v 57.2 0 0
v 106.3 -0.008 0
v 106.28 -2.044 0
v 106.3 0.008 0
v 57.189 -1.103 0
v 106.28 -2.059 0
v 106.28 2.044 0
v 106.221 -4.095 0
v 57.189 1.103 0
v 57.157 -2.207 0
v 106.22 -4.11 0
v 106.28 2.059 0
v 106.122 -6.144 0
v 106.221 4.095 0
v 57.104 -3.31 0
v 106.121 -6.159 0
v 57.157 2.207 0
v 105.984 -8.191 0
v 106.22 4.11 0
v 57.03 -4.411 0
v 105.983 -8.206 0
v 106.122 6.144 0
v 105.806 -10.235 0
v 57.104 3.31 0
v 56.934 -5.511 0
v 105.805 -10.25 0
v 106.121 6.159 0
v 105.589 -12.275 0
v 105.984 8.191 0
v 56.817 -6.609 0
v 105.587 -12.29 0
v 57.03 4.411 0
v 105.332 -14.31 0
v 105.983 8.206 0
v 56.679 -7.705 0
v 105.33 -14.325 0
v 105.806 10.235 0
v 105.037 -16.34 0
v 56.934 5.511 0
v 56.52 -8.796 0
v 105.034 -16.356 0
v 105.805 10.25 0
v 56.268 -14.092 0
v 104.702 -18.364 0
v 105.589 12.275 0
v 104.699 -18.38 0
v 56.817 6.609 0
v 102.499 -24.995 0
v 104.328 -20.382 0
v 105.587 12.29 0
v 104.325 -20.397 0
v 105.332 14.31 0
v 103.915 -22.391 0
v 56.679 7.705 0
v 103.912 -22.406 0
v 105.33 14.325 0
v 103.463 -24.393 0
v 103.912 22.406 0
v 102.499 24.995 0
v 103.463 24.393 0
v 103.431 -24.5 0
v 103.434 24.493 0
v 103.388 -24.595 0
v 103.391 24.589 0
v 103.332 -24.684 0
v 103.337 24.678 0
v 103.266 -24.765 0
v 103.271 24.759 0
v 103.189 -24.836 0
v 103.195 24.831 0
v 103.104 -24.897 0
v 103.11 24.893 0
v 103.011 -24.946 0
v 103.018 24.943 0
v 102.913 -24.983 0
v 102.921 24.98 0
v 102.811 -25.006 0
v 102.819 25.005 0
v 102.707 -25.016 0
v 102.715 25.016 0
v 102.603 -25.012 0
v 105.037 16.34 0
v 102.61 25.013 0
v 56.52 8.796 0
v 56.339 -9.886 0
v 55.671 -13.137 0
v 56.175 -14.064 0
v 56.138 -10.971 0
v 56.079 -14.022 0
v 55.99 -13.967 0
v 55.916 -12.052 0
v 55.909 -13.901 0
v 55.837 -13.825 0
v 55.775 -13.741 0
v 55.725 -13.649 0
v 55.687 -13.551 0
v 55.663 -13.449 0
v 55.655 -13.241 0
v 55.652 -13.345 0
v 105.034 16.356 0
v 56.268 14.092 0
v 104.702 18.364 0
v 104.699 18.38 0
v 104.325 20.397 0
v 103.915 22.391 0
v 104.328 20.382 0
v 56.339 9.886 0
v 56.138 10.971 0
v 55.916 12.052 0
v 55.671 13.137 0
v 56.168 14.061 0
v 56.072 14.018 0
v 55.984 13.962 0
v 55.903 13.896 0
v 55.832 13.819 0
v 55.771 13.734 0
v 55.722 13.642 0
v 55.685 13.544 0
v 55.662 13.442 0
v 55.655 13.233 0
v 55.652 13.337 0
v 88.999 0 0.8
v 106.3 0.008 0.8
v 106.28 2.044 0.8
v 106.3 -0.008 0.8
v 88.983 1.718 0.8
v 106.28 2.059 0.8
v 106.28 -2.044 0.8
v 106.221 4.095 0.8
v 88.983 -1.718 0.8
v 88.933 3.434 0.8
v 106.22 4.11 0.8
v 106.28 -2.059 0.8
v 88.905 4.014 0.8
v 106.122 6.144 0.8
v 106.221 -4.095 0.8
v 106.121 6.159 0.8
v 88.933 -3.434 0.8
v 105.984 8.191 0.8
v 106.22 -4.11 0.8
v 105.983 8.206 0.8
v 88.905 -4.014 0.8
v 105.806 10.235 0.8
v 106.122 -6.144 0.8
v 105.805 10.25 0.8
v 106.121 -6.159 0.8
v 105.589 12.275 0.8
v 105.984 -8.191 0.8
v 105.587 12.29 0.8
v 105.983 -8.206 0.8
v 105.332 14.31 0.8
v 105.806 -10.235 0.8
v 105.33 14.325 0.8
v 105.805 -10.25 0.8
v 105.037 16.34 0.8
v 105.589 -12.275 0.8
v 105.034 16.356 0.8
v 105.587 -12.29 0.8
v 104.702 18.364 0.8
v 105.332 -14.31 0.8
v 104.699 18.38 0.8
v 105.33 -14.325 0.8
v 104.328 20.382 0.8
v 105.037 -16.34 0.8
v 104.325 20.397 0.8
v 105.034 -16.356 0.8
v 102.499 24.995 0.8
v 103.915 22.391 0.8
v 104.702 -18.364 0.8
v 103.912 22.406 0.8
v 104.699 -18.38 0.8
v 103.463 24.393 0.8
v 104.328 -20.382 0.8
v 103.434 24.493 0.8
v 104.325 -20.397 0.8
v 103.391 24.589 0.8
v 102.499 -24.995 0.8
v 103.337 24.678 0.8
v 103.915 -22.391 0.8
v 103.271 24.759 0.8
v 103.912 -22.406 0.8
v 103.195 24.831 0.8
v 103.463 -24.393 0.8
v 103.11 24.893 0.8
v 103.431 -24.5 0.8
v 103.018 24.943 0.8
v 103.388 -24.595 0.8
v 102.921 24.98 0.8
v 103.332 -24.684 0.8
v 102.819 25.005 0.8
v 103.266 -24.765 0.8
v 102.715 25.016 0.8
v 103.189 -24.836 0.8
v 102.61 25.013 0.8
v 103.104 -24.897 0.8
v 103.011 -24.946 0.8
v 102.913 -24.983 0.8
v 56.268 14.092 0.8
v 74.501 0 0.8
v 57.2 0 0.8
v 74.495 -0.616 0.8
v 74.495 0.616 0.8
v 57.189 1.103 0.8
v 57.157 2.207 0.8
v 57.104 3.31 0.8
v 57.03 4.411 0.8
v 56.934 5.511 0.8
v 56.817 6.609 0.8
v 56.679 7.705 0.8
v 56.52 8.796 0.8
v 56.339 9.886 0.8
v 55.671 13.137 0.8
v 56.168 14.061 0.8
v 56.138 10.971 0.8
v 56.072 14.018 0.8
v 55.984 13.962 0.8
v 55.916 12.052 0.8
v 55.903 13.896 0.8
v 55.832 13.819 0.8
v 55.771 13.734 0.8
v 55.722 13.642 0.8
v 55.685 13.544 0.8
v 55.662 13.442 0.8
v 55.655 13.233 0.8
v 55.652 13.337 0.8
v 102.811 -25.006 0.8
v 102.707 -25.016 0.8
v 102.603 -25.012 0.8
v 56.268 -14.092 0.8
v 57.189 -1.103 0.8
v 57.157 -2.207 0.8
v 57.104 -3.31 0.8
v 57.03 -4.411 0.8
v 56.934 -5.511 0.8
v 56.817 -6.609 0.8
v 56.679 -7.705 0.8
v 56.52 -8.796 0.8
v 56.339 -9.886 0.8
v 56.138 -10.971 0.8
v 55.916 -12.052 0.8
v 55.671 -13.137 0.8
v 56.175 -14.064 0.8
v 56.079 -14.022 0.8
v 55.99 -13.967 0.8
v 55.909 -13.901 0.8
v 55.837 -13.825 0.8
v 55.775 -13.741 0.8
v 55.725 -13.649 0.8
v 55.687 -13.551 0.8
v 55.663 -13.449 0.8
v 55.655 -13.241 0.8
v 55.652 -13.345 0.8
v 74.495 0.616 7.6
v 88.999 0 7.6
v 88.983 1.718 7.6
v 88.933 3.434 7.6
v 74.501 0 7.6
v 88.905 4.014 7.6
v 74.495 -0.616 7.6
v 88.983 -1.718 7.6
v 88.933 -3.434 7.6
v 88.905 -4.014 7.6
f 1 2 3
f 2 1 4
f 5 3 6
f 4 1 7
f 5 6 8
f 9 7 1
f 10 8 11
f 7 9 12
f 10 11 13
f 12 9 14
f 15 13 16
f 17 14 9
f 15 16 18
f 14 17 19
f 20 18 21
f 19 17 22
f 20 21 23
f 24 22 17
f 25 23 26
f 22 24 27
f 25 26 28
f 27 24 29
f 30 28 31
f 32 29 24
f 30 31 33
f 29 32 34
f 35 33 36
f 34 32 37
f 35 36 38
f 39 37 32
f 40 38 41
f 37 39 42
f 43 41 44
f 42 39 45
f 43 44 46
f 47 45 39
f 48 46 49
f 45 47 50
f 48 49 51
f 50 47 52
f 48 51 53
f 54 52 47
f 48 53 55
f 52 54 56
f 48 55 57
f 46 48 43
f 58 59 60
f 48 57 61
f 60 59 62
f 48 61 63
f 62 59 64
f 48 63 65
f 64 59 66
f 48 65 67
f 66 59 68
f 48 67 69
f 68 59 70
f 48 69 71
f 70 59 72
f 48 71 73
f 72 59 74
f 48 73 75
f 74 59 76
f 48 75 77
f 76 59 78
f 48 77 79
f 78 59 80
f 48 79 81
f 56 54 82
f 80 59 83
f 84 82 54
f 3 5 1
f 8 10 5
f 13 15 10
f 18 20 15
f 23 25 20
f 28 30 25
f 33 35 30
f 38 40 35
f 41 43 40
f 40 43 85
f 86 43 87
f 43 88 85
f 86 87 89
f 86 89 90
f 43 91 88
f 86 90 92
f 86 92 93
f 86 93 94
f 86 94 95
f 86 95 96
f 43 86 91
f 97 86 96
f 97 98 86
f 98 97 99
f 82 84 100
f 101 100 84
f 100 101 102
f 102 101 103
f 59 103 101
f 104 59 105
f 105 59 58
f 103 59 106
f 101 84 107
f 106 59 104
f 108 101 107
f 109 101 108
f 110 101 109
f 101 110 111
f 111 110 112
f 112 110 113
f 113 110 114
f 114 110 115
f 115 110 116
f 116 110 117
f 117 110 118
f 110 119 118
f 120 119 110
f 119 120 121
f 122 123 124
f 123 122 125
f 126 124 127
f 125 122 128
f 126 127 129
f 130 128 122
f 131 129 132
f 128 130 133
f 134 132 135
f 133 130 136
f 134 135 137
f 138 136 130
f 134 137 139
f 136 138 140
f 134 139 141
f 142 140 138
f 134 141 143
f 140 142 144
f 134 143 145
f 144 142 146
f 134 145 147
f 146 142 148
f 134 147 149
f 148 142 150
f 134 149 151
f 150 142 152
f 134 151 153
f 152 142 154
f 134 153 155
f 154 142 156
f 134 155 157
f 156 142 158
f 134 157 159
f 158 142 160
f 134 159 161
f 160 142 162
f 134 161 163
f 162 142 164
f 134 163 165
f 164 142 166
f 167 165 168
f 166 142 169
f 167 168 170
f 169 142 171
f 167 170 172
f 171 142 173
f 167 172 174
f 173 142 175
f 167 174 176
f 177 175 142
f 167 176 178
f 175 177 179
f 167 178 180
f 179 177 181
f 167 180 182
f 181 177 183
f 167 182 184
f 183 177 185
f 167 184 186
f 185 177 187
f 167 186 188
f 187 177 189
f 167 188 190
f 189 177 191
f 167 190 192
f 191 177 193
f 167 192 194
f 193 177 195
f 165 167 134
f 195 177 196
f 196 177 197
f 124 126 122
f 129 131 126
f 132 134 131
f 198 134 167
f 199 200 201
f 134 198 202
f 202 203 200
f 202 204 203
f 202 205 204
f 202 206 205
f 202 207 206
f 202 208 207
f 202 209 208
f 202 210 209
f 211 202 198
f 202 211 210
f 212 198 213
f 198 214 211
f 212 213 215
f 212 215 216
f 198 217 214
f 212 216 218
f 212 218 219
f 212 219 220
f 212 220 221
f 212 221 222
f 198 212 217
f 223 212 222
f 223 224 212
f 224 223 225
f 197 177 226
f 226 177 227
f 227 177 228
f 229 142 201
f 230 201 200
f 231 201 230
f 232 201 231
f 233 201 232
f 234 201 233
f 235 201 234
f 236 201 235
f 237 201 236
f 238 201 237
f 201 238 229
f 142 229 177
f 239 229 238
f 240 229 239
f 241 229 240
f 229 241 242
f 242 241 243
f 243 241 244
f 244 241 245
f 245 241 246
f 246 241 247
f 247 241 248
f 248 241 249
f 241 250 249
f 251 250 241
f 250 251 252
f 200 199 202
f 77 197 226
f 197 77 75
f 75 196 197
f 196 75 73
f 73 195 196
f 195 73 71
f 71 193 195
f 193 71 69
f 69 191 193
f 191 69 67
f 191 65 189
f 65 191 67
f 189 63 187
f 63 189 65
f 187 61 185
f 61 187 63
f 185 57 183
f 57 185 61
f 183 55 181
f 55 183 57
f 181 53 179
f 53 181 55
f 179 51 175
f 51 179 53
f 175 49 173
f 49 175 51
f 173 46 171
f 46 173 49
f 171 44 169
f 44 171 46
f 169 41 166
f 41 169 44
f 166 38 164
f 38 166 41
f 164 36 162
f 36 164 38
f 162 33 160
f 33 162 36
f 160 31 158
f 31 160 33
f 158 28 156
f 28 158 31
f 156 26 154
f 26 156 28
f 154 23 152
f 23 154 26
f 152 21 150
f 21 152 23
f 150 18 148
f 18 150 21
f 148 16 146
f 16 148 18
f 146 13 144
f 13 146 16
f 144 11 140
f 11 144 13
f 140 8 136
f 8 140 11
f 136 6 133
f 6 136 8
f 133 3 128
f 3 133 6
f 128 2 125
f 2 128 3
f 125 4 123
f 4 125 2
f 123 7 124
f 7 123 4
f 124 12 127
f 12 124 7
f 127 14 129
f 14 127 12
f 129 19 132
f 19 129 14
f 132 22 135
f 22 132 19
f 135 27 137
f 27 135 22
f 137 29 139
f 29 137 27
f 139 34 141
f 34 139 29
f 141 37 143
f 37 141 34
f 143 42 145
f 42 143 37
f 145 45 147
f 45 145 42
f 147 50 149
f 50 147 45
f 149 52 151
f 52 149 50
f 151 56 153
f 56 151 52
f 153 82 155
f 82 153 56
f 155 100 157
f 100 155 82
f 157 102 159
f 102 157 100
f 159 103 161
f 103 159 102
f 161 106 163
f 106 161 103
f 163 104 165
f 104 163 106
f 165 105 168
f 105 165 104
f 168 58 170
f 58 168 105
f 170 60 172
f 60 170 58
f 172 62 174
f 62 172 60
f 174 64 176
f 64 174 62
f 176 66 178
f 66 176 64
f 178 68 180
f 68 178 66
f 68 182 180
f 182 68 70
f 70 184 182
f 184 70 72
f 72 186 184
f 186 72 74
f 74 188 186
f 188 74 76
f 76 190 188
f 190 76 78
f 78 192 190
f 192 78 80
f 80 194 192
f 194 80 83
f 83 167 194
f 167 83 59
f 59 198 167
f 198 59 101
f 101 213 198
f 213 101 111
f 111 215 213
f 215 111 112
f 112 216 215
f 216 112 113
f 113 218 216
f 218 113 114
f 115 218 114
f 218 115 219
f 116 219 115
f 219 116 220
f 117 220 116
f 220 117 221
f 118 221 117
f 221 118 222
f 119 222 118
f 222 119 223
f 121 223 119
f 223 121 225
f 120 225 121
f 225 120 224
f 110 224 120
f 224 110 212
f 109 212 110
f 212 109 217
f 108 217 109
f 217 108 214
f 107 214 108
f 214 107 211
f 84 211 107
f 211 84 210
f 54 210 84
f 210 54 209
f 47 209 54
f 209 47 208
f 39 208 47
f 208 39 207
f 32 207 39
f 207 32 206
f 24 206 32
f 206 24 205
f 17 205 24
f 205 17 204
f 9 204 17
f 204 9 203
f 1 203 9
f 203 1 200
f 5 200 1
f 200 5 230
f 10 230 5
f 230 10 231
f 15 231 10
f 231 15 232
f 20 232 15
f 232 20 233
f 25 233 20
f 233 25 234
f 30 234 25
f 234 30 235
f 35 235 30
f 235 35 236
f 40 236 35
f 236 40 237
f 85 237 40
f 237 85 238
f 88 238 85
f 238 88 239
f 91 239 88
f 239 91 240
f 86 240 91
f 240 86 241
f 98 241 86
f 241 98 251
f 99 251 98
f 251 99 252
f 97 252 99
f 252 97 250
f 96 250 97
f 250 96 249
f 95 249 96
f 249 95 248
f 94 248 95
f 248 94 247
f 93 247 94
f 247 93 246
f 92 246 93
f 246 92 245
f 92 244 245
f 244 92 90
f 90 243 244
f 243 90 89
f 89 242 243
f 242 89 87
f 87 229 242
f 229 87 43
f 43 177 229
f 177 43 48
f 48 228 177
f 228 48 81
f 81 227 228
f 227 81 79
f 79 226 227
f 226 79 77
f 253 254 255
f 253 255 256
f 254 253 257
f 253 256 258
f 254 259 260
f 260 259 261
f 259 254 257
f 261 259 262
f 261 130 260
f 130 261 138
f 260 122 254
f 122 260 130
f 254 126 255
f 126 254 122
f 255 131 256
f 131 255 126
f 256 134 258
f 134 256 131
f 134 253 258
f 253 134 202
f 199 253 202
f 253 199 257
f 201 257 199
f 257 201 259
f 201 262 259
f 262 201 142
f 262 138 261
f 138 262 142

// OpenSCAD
// Gen-CY — bobbin BASE (bottom flange + hub). Print x12, flange down. Wind 24 AWG x 306 t around
// the hub with the LID glued on (coil_lid.stl). Copper lives ONLY between the flanges (no proud winds).
include <parameters.scad>;
$fn = 48;
module sector_2d(r_in, r_out, ang) {
    polygon([
        for (a = [-ang/2 : ang/24 : ang/2]) [r_in*cos(a), r_in*sin(a)],
        for (a = [ang/2 : -ang/24 : -ang/2]) [r_out*cos(a), r_out*sin(a)]
    ]);
}
module footprint_2d() { offset(r=wall) sector_2d(coil_id_r, coil_od_r, span_deg); }
module hub_2d()       { offset(delta=-coil_core_inset) sector_2d(coil_id_r, coil_od_r, span_deg); }

union() {
    linear_extrude(flange_t) footprint_2d();
    translate([0, 0, flange_t - 0.01]) linear_extrude(former_web + 0.01) hub_2d();
}
